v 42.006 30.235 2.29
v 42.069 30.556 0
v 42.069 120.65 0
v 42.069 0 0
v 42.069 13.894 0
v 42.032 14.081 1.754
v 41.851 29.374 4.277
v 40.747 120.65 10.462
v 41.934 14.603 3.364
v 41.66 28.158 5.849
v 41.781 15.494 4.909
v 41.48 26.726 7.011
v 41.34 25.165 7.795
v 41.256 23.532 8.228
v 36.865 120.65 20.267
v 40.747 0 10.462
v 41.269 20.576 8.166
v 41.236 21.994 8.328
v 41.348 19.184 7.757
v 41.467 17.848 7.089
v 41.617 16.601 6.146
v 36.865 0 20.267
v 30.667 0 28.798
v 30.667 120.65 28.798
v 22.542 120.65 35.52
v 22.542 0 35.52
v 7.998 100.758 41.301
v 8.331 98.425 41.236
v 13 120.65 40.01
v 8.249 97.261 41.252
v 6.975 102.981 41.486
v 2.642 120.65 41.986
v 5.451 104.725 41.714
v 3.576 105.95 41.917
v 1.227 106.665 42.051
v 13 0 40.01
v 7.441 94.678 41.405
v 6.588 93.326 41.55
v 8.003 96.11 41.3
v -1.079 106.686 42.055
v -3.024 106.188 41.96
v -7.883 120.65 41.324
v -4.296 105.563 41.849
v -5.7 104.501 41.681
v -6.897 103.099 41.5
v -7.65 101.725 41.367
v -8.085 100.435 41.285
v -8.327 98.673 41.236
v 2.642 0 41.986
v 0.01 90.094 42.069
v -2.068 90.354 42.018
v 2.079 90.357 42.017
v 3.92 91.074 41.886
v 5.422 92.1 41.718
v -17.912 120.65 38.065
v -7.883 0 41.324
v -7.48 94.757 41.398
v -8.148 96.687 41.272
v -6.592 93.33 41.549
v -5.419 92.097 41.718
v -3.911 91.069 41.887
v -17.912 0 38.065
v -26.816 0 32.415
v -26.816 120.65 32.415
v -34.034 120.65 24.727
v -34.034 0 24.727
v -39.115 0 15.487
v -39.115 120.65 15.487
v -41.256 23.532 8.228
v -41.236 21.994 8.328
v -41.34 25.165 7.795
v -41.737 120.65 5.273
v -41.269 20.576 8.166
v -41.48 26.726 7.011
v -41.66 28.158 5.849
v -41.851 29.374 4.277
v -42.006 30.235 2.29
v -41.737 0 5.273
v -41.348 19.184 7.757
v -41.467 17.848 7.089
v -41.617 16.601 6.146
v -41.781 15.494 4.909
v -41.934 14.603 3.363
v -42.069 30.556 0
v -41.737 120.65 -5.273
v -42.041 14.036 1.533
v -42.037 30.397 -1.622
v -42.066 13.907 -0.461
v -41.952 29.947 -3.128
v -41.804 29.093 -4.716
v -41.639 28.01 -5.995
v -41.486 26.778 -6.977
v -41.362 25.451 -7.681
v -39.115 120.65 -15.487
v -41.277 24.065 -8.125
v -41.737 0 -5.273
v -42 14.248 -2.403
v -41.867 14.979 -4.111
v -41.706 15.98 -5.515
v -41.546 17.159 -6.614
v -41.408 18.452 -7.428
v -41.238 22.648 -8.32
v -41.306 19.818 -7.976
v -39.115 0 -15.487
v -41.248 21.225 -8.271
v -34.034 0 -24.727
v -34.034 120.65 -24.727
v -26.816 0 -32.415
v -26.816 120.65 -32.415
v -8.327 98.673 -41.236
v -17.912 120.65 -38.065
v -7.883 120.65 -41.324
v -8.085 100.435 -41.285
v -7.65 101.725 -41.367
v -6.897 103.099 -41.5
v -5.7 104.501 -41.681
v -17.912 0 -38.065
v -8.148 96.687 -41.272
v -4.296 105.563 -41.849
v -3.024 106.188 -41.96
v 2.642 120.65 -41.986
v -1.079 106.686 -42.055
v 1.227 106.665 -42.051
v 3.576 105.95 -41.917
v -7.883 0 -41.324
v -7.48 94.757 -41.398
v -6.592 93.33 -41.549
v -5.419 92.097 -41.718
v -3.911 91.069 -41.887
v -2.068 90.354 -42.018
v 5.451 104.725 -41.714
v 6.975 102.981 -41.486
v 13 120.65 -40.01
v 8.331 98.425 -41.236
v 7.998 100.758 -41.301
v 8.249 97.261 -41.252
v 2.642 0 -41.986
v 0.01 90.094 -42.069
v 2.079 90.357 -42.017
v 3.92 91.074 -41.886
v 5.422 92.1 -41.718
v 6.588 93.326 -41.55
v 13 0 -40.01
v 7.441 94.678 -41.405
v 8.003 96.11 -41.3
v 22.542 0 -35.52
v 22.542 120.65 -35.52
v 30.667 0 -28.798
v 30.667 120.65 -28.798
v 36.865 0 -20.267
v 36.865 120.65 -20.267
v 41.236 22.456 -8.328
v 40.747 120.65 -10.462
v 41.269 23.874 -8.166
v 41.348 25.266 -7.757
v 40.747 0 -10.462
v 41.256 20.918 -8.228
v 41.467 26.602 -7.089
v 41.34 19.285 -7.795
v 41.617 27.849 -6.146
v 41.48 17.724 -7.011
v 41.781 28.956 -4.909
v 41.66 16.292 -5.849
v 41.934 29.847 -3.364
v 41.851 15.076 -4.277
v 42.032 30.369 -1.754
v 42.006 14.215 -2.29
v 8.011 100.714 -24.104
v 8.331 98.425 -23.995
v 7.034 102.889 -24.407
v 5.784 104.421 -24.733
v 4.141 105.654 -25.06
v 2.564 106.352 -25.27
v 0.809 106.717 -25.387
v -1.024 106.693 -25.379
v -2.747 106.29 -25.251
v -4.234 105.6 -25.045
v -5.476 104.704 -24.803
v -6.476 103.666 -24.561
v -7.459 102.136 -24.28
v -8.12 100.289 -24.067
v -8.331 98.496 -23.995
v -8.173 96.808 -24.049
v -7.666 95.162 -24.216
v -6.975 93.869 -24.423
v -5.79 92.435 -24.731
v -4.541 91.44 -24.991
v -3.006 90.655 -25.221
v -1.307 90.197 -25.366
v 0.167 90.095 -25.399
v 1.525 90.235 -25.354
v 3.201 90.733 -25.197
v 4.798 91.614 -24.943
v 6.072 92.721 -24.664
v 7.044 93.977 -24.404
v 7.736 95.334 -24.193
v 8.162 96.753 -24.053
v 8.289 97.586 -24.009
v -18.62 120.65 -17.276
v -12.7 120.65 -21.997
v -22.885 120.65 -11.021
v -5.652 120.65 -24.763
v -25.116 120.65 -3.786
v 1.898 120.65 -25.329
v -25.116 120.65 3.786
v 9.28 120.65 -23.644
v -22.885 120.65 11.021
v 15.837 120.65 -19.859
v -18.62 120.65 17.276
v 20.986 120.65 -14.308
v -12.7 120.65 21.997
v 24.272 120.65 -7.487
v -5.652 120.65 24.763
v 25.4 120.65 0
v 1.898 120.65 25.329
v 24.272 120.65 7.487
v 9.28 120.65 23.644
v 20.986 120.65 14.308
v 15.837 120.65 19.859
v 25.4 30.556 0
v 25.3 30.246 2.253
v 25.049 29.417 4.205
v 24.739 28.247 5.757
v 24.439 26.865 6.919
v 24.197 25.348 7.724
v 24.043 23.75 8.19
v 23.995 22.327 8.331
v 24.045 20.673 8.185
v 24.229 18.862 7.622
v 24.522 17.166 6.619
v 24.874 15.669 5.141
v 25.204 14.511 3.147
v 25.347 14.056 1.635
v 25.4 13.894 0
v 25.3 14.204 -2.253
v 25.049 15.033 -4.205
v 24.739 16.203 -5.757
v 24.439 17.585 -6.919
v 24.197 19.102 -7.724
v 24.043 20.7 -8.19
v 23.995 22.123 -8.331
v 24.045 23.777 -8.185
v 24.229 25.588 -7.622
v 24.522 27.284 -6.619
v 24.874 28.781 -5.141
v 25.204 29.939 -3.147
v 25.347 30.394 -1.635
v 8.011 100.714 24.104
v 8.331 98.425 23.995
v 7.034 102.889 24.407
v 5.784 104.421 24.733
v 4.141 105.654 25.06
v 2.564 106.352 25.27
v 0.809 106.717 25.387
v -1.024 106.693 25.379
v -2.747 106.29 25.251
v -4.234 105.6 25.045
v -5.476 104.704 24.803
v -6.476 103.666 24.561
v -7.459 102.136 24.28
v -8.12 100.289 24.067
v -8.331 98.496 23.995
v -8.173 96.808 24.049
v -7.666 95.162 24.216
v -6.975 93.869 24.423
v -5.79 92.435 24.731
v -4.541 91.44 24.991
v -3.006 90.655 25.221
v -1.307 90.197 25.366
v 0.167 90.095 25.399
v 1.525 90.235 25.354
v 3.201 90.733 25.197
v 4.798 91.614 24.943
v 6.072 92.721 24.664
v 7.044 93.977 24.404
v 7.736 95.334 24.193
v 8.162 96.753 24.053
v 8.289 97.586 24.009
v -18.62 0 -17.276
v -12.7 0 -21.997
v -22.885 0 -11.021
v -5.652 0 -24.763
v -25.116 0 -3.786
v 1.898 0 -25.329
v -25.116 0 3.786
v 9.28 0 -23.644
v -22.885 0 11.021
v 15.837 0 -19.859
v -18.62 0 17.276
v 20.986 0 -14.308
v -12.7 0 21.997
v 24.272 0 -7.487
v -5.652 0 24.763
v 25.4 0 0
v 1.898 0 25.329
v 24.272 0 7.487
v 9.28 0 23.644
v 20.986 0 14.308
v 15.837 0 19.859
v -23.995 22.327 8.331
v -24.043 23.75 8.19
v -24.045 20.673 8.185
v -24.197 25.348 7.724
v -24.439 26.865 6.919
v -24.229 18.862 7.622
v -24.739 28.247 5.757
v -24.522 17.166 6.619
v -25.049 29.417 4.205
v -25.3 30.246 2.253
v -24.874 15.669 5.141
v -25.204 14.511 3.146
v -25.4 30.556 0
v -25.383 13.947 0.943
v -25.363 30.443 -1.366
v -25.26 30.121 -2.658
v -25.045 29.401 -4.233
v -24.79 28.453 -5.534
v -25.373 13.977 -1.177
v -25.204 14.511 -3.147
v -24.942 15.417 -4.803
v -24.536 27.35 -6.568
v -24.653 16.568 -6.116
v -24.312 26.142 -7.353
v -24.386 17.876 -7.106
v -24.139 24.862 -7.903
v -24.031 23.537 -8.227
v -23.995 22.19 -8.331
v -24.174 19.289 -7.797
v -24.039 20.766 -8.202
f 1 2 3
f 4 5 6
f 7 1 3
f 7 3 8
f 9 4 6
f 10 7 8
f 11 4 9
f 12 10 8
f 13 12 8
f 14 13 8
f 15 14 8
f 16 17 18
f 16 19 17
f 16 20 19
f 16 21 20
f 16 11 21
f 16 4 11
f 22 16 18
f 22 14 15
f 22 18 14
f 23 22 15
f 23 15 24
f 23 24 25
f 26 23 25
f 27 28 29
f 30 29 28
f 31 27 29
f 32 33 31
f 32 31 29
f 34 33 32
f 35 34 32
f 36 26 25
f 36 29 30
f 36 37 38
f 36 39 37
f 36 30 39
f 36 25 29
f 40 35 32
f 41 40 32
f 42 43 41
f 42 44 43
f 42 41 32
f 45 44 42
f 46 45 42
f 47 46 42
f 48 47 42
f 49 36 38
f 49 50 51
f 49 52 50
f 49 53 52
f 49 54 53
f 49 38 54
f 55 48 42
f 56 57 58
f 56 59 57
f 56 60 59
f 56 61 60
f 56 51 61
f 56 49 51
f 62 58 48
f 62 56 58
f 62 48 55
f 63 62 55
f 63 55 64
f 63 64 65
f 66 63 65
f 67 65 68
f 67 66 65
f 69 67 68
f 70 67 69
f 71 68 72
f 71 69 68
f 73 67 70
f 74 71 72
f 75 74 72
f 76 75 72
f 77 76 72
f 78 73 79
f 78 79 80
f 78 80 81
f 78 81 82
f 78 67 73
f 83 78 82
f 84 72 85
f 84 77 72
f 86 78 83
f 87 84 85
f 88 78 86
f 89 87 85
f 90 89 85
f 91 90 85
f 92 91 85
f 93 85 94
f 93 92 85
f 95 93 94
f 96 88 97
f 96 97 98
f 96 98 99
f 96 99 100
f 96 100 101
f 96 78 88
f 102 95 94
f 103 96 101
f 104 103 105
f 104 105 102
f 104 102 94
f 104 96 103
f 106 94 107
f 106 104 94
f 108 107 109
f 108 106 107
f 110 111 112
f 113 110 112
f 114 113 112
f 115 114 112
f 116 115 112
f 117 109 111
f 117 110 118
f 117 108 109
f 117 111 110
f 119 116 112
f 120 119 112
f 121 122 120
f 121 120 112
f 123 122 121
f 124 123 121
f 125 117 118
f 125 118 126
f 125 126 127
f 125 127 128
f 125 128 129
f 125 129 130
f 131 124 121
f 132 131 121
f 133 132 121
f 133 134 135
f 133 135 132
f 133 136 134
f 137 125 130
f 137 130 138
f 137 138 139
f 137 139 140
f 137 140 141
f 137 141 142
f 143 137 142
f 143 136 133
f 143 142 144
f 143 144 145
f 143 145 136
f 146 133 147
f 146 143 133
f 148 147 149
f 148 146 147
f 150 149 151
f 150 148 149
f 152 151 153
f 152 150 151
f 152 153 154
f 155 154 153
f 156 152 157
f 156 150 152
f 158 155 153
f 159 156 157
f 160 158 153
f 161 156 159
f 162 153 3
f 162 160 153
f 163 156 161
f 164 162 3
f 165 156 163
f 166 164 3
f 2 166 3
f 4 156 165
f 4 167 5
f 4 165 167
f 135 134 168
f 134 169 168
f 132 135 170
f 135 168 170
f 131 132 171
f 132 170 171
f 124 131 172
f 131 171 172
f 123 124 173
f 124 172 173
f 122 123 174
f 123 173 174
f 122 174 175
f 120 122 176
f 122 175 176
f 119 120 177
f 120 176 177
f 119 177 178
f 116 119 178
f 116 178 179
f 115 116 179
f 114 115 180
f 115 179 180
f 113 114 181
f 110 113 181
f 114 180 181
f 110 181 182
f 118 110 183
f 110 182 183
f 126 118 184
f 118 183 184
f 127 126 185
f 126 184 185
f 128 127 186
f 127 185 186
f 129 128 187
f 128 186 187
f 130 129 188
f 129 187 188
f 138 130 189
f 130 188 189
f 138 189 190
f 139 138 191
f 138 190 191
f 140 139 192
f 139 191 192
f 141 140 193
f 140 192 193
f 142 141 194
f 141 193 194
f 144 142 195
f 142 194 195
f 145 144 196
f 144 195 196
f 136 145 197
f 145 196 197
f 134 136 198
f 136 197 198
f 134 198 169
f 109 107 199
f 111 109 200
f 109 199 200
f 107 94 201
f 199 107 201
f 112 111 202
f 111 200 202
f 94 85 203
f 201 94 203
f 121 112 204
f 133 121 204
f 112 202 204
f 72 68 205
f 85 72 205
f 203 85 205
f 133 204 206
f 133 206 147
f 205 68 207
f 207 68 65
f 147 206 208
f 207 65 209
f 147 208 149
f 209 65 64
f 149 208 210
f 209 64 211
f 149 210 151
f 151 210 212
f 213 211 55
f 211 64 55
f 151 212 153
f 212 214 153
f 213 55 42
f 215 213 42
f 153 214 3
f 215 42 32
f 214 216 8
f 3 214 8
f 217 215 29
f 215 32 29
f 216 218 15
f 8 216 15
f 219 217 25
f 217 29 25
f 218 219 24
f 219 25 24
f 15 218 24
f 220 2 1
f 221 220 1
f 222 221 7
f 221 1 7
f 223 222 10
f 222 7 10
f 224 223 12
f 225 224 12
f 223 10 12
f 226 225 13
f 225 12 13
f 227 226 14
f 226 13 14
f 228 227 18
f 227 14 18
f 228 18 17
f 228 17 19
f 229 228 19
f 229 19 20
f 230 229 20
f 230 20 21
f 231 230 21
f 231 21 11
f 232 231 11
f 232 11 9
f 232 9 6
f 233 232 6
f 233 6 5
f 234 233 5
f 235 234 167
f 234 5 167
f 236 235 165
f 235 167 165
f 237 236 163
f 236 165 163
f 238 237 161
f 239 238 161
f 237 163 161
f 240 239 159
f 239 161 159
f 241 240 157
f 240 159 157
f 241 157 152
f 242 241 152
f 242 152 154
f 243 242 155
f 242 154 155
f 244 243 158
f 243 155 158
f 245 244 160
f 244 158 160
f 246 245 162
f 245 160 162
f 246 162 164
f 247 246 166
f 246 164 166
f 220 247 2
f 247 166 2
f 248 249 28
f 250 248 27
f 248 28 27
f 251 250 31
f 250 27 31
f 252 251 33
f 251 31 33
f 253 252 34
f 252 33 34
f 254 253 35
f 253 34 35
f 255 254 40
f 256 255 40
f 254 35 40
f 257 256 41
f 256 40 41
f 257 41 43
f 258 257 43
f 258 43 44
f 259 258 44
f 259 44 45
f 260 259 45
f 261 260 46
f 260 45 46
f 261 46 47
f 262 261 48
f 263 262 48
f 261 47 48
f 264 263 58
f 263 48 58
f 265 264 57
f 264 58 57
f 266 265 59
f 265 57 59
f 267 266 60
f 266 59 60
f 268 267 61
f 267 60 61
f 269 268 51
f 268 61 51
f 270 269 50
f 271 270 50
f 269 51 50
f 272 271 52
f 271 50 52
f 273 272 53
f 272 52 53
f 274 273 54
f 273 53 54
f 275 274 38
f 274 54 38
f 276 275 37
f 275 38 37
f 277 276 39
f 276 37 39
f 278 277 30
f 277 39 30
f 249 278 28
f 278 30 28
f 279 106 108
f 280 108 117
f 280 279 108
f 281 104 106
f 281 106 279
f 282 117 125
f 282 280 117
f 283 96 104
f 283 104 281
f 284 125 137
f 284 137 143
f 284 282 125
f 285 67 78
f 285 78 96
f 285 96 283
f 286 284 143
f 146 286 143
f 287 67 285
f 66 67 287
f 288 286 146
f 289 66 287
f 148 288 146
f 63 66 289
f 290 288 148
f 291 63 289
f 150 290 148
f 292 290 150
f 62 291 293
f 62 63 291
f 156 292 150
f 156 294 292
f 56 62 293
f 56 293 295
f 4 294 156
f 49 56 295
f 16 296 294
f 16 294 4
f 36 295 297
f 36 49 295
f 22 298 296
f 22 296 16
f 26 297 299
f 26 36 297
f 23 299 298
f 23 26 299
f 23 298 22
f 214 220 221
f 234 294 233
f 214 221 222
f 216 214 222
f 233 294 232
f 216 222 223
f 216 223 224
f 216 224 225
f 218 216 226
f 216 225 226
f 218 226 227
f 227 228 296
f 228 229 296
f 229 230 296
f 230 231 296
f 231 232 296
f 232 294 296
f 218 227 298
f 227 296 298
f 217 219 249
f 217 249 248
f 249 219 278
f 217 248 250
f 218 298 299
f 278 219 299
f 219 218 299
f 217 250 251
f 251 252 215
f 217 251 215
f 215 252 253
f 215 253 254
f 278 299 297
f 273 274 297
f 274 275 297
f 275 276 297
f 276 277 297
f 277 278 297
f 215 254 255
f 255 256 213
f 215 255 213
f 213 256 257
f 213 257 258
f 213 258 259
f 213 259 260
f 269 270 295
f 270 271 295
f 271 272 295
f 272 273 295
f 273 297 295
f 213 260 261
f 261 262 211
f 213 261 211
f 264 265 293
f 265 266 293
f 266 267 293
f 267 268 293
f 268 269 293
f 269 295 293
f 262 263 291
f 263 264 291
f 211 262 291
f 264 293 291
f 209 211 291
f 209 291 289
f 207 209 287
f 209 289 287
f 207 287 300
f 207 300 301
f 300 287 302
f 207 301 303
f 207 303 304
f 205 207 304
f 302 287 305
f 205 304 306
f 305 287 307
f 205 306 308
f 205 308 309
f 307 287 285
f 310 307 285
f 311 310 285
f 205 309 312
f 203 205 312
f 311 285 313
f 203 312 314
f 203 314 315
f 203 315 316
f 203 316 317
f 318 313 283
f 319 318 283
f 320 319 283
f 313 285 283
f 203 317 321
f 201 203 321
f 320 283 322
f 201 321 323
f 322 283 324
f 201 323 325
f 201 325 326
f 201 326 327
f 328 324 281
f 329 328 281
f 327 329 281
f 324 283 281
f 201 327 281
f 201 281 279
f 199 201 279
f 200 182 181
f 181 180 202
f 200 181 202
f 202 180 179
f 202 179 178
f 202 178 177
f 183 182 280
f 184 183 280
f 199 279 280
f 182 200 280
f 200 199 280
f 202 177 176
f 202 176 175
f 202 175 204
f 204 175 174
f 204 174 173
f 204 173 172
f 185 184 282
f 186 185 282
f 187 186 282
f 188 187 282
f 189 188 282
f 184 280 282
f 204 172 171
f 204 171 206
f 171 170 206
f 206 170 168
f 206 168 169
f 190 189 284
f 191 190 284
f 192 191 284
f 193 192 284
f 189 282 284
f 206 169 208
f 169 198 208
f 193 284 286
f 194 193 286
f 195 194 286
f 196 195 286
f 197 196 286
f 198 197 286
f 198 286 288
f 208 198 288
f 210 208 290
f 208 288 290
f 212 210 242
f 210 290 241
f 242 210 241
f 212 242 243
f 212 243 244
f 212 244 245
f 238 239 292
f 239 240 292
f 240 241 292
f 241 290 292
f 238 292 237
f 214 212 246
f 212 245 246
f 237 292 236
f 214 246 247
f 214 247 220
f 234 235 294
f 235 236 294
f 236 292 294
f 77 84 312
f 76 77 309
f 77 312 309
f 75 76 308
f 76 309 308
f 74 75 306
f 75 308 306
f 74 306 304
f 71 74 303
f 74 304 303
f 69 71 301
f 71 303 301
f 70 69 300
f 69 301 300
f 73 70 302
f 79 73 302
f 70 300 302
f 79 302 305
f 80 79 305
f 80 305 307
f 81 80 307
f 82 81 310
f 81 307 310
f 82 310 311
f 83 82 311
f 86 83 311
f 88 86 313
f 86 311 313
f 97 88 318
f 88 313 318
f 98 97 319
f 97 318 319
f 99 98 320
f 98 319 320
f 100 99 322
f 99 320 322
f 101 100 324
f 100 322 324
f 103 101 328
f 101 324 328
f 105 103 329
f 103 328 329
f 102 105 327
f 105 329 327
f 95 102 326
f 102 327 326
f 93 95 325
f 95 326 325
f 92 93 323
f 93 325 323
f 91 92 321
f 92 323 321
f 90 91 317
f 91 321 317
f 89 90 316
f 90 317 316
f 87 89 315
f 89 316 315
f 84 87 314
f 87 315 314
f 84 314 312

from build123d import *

# Parameters (mm, degrees)
F0_R     = 42.06875
F0_R_2   = 25.4
F1_DEPTH = 120.65
F2_R     = 8.3312
F3_DEPTH = 63.5
F4_R     = 8.3312
F5_DEPTH = 50.8


with BuildPart() as f1:
    # F0 (on Front) → F1 (new body)
    with BuildSketch(Plane.XZ):
        Circle(F0_R)
        Circle(F0_R_2, mode=Mode.SUBTRACT)
    extrude(amount=-F1_DEPTH)

    # F2 (on Right) → F3 (cut, symmetric)
    with BuildSketch(Plane.YZ):
        with Locations((22.225, 0)):
            Circle(F2_R)
    extrude(amount=F3_DEPTH, both=True, mode=Mode.SUBTRACT)

    # F4 (on Top) → F5 (cut, symmetric)
    with BuildSketch(Plane.XY):
        with Locations((0, 98.425)):
            Circle(F4_R)
    extrude(amount=F5_DEPTH, both=True, mode=Mode.SUBTRACT)


solid = f1.part
